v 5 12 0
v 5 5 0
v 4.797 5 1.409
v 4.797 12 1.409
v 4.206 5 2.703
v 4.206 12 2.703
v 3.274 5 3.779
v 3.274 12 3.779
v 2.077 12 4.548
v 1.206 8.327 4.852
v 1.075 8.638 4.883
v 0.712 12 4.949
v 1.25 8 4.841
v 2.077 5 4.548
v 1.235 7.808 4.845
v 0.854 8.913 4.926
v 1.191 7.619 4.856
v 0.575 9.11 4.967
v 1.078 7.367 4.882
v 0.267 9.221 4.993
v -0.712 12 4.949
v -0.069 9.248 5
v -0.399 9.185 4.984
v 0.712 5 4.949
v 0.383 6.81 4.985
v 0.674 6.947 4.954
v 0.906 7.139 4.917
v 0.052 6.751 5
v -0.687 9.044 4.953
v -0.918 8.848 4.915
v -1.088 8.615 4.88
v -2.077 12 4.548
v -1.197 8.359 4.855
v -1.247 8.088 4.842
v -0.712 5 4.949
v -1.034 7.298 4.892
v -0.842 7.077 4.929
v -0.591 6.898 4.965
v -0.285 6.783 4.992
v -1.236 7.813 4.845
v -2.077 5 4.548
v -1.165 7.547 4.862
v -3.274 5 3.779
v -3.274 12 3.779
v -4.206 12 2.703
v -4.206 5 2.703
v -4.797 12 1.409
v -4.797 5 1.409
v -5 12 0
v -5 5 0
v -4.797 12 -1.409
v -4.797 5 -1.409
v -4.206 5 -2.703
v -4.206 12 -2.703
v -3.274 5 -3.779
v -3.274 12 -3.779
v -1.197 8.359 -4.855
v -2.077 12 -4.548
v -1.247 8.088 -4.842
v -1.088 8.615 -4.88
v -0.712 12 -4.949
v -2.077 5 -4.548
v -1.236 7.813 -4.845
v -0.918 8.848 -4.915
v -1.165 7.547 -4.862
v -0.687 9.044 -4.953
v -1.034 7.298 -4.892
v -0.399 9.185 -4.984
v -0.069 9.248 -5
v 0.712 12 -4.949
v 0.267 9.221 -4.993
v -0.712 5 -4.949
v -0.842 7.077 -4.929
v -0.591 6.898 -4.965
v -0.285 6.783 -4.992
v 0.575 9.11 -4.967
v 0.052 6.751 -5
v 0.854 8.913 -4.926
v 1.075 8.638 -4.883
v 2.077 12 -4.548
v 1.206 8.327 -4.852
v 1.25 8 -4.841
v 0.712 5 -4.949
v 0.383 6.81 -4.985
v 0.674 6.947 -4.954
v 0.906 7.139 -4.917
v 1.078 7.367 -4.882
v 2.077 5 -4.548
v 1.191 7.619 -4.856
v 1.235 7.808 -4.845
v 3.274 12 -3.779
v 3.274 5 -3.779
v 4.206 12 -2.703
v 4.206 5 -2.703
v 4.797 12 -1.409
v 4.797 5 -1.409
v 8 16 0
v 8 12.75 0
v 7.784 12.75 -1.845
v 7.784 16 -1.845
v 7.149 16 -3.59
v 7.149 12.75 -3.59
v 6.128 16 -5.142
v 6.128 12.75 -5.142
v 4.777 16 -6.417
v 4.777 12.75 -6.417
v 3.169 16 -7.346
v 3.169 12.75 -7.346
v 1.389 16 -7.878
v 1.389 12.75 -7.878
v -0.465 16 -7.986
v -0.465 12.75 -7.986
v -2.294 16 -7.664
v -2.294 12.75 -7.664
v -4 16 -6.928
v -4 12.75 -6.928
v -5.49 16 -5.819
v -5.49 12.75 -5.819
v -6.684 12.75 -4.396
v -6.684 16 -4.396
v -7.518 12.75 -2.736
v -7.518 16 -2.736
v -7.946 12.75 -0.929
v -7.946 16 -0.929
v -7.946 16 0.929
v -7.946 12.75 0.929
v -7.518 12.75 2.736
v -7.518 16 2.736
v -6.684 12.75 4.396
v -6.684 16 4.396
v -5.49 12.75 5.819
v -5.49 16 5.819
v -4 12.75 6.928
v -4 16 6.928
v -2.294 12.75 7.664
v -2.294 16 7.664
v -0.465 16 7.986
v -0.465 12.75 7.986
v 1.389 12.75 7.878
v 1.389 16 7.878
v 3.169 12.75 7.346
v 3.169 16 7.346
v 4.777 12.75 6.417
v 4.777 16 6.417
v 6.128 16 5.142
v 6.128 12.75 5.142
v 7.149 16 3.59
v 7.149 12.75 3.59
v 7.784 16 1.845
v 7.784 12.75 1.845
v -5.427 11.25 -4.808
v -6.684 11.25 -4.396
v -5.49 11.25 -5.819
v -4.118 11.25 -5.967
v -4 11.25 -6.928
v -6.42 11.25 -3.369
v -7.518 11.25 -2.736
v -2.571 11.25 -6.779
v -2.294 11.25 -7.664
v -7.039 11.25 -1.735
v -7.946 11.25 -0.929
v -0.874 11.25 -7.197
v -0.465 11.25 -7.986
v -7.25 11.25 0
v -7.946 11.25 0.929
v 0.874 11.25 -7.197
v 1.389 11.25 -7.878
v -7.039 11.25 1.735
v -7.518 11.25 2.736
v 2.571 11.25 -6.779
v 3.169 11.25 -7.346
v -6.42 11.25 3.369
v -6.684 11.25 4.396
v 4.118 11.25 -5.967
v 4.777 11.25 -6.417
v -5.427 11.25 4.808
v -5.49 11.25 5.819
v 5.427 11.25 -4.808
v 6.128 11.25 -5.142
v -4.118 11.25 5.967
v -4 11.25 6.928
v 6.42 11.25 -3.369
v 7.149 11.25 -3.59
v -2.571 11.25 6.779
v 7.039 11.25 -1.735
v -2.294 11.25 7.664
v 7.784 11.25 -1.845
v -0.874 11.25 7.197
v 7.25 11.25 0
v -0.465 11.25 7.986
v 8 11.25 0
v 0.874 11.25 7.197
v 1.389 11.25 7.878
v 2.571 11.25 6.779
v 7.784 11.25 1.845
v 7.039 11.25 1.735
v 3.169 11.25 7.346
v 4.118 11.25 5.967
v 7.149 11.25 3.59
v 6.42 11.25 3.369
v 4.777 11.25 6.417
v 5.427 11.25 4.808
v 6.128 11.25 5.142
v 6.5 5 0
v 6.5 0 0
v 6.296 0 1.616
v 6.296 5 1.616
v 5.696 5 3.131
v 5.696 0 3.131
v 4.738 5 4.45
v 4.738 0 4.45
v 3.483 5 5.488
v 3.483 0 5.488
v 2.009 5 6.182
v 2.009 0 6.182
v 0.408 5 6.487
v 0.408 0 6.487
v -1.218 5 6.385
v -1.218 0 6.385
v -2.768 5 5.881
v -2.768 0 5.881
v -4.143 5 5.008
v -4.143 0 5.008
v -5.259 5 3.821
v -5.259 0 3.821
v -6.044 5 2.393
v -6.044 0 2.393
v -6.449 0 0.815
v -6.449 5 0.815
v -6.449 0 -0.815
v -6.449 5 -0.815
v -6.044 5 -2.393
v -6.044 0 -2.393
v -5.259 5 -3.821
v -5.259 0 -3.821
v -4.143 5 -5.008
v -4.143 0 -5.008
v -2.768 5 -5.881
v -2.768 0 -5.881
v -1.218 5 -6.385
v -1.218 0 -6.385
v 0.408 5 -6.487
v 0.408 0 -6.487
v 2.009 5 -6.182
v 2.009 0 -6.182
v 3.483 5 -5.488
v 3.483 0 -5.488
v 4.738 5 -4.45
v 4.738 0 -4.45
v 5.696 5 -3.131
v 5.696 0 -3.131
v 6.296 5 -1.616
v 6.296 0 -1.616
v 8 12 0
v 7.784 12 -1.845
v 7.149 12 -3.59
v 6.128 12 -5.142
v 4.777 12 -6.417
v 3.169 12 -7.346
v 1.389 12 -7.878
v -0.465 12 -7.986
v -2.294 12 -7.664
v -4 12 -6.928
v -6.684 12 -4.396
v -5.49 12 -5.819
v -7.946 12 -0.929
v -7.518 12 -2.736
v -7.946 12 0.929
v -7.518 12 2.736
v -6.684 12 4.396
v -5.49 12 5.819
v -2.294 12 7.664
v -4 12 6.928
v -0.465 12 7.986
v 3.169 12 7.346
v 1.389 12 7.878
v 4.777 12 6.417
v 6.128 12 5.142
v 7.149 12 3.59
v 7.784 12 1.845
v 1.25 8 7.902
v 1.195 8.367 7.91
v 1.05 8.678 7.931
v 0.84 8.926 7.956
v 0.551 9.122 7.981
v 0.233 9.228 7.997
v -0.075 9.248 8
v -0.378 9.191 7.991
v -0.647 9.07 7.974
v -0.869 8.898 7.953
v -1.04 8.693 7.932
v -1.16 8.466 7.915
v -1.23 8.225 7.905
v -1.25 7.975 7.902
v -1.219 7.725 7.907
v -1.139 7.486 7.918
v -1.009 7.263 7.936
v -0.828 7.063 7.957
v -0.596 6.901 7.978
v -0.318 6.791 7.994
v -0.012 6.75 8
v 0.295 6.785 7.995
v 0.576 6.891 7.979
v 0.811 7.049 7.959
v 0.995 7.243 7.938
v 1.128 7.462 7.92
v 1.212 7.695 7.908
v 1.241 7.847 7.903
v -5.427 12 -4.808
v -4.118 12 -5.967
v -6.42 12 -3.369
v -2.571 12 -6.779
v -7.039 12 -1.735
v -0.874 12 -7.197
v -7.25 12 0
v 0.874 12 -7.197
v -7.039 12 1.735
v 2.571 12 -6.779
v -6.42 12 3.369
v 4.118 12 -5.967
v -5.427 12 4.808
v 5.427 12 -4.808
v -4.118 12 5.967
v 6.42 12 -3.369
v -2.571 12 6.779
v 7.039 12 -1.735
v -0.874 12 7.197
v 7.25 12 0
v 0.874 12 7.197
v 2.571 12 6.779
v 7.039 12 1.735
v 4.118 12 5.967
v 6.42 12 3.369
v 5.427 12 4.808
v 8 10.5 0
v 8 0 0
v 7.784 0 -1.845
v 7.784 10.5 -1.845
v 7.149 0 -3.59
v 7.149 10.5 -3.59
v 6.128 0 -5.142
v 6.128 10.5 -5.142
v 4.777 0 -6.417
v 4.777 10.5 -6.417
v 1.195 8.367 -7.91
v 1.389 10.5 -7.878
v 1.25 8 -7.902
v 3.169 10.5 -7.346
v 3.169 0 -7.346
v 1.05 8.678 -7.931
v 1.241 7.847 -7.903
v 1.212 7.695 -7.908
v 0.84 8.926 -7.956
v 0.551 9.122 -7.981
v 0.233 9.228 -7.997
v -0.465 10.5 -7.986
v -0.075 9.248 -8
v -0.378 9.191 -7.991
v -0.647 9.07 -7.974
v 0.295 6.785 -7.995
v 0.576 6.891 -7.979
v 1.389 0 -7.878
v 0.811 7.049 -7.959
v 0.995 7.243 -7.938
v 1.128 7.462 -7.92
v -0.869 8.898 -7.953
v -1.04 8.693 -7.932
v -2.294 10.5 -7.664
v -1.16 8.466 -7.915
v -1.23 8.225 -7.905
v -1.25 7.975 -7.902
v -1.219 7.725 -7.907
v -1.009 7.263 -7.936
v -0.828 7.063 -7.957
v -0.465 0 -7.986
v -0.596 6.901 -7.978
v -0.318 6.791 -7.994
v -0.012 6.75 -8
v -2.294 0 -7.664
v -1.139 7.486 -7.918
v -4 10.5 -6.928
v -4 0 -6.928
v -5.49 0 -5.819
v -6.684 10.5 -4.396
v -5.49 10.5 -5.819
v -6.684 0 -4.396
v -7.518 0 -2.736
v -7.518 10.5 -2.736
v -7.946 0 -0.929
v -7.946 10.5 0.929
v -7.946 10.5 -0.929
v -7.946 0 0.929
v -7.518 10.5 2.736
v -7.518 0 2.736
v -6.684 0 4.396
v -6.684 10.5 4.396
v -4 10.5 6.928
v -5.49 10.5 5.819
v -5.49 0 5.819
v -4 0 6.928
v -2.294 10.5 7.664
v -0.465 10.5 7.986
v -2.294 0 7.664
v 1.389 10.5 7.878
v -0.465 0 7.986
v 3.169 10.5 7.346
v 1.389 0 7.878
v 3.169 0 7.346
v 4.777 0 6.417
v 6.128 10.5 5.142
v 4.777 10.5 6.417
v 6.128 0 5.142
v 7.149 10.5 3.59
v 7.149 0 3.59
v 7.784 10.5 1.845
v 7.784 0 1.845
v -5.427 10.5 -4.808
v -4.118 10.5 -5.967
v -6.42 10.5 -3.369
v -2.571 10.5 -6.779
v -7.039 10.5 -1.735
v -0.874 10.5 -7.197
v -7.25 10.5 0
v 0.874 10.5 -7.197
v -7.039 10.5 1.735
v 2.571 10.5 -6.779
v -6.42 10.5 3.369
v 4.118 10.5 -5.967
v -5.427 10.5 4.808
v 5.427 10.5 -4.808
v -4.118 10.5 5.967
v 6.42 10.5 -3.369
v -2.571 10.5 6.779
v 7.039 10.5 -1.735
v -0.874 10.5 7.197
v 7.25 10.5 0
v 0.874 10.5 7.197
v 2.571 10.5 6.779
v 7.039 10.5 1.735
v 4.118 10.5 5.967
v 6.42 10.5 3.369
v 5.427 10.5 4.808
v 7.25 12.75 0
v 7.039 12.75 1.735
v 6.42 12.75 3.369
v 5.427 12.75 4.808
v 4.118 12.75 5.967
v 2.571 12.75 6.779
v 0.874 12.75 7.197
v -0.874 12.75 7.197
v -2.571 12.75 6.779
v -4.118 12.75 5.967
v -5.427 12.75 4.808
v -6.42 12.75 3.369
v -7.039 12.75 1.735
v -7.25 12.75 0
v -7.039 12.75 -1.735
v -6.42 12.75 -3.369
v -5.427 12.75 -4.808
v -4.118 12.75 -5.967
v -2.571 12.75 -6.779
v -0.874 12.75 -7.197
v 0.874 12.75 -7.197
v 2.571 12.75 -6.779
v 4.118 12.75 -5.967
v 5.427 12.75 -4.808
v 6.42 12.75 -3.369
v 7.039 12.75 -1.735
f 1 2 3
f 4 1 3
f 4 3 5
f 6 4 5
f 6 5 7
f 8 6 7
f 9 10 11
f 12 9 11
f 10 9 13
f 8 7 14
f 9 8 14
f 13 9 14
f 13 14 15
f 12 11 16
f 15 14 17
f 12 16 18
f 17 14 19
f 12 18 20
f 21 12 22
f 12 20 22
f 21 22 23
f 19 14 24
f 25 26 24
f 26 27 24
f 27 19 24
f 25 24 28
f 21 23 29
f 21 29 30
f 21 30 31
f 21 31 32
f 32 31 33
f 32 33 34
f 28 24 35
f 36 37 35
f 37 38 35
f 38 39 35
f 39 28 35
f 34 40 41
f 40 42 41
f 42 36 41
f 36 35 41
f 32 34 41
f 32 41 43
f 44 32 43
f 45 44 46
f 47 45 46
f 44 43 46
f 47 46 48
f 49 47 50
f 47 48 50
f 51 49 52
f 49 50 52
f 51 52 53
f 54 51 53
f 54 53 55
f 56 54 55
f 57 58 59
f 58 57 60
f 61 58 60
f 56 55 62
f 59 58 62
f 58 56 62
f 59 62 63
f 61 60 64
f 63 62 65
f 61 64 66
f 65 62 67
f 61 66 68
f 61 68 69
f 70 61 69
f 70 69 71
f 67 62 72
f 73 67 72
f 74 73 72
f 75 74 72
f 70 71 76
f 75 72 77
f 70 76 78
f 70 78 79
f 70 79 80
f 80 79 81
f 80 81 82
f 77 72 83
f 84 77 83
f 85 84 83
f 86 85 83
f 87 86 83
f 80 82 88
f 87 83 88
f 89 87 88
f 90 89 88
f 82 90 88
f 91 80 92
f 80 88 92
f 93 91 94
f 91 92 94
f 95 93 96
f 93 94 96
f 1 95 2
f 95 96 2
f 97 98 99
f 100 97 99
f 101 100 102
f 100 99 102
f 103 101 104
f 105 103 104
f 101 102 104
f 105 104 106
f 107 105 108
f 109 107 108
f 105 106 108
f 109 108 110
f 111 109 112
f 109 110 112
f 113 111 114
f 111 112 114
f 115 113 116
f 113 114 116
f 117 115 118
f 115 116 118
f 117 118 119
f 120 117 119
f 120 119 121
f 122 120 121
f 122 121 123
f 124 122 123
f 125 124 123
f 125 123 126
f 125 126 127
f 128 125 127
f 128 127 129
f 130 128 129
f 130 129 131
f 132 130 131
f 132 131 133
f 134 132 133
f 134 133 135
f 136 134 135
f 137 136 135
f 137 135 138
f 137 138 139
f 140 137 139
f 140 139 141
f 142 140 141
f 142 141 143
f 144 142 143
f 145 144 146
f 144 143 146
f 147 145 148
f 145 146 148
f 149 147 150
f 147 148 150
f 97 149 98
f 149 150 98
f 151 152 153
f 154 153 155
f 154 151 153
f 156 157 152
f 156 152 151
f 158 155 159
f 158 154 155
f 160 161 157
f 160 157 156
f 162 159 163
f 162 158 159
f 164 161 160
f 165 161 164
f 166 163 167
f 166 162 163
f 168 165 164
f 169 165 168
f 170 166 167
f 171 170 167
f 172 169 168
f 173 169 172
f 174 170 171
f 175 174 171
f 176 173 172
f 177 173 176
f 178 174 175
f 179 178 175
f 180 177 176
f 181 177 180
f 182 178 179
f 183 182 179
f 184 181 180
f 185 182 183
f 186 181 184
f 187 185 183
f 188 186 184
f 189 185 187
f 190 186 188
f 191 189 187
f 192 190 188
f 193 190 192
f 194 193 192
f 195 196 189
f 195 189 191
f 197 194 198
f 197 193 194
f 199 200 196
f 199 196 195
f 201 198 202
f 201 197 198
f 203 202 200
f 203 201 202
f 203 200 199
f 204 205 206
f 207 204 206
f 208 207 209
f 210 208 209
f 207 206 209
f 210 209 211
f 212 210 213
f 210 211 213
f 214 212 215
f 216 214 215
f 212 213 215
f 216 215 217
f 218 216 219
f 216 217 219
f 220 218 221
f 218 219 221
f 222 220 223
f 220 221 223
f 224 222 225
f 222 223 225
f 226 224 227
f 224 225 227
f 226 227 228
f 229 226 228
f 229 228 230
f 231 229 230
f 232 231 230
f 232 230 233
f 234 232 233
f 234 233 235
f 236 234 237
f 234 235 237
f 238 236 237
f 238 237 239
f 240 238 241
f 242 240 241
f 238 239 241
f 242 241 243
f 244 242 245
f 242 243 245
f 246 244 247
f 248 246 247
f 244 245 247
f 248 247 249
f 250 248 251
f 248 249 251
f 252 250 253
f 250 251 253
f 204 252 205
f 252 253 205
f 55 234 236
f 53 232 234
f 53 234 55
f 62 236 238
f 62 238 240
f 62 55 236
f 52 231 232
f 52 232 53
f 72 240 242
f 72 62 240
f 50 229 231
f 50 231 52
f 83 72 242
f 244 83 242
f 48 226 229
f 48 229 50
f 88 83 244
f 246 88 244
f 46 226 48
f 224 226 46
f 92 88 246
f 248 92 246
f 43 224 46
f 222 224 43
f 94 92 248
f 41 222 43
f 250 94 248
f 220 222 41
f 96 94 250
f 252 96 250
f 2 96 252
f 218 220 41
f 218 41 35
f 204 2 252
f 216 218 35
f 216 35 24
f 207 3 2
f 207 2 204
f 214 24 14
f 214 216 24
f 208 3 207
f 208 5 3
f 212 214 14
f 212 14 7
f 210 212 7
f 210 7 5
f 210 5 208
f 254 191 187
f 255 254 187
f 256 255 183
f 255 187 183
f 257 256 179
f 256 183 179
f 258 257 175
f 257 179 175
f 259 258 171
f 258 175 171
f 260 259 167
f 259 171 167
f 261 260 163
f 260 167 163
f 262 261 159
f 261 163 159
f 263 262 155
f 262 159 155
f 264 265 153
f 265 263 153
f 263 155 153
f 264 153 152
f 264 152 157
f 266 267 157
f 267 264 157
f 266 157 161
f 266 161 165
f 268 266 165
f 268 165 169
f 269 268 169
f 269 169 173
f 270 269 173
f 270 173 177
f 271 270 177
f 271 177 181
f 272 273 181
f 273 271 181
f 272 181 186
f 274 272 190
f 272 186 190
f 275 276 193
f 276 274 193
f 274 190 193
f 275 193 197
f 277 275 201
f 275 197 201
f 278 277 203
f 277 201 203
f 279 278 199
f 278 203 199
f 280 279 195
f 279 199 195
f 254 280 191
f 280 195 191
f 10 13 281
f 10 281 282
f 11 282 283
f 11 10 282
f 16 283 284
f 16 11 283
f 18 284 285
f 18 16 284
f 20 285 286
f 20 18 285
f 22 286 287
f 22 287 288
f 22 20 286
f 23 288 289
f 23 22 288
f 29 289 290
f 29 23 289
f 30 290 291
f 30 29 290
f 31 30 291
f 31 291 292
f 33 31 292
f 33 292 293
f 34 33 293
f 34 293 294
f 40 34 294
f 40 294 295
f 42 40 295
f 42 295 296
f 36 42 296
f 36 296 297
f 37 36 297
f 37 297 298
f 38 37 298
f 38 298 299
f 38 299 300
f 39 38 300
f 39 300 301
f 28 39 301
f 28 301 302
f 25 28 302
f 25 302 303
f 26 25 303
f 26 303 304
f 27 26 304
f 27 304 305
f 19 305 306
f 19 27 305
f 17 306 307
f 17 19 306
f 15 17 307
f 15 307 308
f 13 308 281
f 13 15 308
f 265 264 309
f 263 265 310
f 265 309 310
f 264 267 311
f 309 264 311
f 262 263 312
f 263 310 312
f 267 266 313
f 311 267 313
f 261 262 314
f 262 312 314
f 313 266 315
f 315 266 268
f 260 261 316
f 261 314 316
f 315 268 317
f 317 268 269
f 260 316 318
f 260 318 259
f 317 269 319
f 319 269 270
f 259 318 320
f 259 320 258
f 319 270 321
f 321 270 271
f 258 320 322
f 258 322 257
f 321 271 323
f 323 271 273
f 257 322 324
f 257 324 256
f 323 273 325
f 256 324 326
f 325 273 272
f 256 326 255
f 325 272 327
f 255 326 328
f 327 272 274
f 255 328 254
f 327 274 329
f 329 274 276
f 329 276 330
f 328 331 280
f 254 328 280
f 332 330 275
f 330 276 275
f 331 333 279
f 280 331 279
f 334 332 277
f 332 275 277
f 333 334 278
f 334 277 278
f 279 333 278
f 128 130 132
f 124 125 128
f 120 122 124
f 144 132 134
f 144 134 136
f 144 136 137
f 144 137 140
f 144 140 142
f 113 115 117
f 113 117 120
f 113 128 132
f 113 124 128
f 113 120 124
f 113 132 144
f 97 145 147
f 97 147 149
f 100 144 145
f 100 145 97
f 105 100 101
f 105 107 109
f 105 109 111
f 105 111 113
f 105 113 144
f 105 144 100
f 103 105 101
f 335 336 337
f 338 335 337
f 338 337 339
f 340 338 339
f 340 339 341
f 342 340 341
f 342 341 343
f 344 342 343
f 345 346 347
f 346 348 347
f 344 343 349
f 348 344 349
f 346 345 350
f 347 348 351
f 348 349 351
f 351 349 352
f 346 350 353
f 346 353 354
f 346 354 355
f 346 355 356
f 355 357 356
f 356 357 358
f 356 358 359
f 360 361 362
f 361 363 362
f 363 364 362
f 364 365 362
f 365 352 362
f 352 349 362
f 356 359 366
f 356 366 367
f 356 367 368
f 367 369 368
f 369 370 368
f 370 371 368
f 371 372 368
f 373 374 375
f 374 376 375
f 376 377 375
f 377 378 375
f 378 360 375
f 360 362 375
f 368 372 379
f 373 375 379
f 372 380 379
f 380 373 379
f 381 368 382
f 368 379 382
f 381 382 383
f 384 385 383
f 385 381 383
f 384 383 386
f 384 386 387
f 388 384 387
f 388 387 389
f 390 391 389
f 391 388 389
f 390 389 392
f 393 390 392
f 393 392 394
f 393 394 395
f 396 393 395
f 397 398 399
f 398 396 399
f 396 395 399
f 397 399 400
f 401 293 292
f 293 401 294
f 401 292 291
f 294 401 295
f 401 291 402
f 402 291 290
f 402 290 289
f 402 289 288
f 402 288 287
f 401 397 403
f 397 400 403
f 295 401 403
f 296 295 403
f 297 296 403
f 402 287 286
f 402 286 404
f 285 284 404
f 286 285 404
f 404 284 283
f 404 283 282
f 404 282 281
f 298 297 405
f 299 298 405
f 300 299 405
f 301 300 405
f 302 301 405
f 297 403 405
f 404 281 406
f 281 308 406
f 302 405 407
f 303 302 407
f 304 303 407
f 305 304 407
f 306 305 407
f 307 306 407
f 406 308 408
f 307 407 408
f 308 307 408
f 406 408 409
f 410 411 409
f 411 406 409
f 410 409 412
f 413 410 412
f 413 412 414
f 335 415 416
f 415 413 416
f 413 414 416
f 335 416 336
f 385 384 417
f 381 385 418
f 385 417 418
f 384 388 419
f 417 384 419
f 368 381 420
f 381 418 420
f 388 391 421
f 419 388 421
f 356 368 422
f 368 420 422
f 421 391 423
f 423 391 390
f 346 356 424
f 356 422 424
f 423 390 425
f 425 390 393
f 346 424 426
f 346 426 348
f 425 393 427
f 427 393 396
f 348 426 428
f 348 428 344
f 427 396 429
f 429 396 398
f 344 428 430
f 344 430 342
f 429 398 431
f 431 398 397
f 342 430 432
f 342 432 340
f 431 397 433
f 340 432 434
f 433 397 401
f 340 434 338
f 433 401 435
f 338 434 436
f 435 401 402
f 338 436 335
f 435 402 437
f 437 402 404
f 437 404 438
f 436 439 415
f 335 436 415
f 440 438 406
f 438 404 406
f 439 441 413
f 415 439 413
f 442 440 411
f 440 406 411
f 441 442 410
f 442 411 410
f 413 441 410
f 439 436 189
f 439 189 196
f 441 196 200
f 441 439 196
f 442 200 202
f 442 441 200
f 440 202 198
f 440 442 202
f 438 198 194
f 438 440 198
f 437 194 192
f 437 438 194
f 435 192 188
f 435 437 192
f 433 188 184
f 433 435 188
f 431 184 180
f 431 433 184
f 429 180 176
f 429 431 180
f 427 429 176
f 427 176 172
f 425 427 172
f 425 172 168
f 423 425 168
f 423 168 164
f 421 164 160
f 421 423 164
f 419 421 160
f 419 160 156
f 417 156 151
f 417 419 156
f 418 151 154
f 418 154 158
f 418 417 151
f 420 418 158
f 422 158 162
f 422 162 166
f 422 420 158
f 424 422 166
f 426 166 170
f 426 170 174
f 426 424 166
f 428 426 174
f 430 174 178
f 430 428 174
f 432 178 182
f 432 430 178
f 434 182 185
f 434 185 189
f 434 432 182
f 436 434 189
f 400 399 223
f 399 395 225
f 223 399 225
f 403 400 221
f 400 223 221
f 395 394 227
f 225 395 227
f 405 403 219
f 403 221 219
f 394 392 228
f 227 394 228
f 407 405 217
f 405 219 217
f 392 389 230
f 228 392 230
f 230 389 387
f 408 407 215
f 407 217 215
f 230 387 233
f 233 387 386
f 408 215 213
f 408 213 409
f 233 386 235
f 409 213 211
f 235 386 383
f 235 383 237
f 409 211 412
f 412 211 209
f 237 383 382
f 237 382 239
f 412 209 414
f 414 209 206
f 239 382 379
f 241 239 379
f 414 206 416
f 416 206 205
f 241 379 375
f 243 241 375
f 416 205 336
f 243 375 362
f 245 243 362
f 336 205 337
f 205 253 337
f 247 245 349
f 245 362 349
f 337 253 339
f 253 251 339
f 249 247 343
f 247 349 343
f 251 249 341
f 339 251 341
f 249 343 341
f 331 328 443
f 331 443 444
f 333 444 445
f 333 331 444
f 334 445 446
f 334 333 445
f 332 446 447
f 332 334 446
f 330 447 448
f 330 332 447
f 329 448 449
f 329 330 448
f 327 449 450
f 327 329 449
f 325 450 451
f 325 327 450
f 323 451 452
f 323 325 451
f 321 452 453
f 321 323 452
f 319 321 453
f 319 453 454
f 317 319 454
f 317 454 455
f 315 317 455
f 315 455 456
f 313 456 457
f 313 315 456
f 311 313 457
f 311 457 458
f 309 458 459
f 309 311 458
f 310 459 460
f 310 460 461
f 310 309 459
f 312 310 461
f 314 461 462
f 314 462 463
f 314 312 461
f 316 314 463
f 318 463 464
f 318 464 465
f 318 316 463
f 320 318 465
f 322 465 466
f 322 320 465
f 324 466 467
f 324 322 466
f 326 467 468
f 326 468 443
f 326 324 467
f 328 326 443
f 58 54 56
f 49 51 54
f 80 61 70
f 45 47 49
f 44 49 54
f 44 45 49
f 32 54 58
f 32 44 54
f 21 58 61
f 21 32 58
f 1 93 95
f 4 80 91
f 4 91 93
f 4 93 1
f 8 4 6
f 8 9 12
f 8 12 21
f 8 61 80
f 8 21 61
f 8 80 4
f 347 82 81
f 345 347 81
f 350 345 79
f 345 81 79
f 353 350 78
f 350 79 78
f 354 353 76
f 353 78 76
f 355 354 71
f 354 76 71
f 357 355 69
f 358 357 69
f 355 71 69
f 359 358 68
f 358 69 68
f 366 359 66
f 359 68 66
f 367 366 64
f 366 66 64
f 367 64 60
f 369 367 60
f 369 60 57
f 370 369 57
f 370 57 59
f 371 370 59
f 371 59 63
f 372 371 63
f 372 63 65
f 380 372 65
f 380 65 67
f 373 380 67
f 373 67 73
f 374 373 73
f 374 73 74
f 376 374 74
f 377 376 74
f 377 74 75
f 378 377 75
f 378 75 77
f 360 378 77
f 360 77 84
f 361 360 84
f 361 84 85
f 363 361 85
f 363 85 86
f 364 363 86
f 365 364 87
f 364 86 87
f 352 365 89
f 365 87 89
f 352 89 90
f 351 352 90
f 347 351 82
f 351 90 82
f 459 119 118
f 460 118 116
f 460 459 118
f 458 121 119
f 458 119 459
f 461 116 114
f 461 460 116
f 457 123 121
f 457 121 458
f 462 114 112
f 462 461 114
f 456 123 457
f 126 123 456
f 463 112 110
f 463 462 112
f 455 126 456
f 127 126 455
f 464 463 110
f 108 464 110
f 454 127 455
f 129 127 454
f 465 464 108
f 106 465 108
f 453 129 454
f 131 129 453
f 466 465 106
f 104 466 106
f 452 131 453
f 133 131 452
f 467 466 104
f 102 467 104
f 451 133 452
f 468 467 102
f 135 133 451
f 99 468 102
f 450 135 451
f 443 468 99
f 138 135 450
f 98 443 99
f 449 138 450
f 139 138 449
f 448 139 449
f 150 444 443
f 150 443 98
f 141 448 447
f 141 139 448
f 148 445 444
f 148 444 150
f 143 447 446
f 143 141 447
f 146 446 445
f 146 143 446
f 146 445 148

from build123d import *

# Parameters (mm, degrees)
SKETCH1_R               = 8
BOSS_EXTRUDE1_DEPTH     = 16
SKETCH2_R               = 6.5
CUT_EXTRUDE1_DEPTH      = 5
SKETCH3_R               = 5
CUT_EXTRUDE2_DEPTH      = 12
SKETCH4_R               = 1.25
CUT_EXTRUDE3_DEPTH      = 9
CUT_EXTRUDE3_DEPTH_BACK = 9
CUT_EXTRUDE5_START      = -10.5
SKETCH5_R               = 8
SKETCH5_R_2             = 7.25
CUT_EXTRUDE5_DEPTH      = 0.75
CUT_EXTRUDE6_START      = -12
SKETCH5_3_R             = 8
SKETCH5_3_R_2           = 7.25
CUT_EXTRUDE6_DEPTH      = 0.75


with BuildPart() as part:
    # Sketch1 → Boss-Extrude1 (new body)
    with BuildSketch(Plane(origin=(0, 0, 0), x_dir=(1, 0, 0), z_dir=(0, 1, 0))):
        Circle(SKETCH1_R)
    extrude(amount=BOSS_EXTRUDE1_DEPTH)

    # Sketch2 → Cut-Extrude1 (cut)
    with BuildSketch(Plane.XZ):
        Circle(SKETCH2_R)
    extrude(amount=-CUT_EXTRUDE1_DEPTH, mode=Mode.SUBTRACT)

    # Sketch3 → Cut-Extrude2 (cut)
    with BuildSketch(Plane.XZ):
        Circle(SKETCH3_R)
    extrude(amount=-CUT_EXTRUDE2_DEPTH, mode=Mode.SUBTRACT)

    # Sketch4 → Cut-Extrude3 (cut, two sides)
    with BuildSketch(Plane.XY) as cut_extrude3_sk:
        with Locations((0, 8)):
            Circle(SKETCH4_R)
    extrude(amount=CUT_EXTRUDE3_DEPTH, mode=Mode.SUBTRACT)
    extrude(cut_extrude3_sk.sketch, amount=-CUT_EXTRUDE3_DEPTH_BACK, mode=Mode.SUBTRACT)

    # Sketch5 → Cut-Extrude5 (cut)
    with BuildSketch(Plane.XZ.offset(CUT_EXTRUDE5_START)):
        Circle(SKETCH5_R)
        Circle(SKETCH5_R_2, mode=Mode.SUBTRACT)
    extrude(amount=-CUT_EXTRUDE5_DEPTH, mode=Mode.SUBTRACT)

    # Sketch5<3> → Cut-Extrude6 (cut)
    with BuildSketch(Plane.XZ.offset(CUT_EXTRUDE6_START)):
        Circle(SKETCH5_3_R)
        Circle(SKETCH5_3_R_2, mode=Mode.SUBTRACT)
    extrude(amount=-CUT_EXTRUDE6_DEPTH, mode=Mode.SUBTRACT)


solid = part.part
